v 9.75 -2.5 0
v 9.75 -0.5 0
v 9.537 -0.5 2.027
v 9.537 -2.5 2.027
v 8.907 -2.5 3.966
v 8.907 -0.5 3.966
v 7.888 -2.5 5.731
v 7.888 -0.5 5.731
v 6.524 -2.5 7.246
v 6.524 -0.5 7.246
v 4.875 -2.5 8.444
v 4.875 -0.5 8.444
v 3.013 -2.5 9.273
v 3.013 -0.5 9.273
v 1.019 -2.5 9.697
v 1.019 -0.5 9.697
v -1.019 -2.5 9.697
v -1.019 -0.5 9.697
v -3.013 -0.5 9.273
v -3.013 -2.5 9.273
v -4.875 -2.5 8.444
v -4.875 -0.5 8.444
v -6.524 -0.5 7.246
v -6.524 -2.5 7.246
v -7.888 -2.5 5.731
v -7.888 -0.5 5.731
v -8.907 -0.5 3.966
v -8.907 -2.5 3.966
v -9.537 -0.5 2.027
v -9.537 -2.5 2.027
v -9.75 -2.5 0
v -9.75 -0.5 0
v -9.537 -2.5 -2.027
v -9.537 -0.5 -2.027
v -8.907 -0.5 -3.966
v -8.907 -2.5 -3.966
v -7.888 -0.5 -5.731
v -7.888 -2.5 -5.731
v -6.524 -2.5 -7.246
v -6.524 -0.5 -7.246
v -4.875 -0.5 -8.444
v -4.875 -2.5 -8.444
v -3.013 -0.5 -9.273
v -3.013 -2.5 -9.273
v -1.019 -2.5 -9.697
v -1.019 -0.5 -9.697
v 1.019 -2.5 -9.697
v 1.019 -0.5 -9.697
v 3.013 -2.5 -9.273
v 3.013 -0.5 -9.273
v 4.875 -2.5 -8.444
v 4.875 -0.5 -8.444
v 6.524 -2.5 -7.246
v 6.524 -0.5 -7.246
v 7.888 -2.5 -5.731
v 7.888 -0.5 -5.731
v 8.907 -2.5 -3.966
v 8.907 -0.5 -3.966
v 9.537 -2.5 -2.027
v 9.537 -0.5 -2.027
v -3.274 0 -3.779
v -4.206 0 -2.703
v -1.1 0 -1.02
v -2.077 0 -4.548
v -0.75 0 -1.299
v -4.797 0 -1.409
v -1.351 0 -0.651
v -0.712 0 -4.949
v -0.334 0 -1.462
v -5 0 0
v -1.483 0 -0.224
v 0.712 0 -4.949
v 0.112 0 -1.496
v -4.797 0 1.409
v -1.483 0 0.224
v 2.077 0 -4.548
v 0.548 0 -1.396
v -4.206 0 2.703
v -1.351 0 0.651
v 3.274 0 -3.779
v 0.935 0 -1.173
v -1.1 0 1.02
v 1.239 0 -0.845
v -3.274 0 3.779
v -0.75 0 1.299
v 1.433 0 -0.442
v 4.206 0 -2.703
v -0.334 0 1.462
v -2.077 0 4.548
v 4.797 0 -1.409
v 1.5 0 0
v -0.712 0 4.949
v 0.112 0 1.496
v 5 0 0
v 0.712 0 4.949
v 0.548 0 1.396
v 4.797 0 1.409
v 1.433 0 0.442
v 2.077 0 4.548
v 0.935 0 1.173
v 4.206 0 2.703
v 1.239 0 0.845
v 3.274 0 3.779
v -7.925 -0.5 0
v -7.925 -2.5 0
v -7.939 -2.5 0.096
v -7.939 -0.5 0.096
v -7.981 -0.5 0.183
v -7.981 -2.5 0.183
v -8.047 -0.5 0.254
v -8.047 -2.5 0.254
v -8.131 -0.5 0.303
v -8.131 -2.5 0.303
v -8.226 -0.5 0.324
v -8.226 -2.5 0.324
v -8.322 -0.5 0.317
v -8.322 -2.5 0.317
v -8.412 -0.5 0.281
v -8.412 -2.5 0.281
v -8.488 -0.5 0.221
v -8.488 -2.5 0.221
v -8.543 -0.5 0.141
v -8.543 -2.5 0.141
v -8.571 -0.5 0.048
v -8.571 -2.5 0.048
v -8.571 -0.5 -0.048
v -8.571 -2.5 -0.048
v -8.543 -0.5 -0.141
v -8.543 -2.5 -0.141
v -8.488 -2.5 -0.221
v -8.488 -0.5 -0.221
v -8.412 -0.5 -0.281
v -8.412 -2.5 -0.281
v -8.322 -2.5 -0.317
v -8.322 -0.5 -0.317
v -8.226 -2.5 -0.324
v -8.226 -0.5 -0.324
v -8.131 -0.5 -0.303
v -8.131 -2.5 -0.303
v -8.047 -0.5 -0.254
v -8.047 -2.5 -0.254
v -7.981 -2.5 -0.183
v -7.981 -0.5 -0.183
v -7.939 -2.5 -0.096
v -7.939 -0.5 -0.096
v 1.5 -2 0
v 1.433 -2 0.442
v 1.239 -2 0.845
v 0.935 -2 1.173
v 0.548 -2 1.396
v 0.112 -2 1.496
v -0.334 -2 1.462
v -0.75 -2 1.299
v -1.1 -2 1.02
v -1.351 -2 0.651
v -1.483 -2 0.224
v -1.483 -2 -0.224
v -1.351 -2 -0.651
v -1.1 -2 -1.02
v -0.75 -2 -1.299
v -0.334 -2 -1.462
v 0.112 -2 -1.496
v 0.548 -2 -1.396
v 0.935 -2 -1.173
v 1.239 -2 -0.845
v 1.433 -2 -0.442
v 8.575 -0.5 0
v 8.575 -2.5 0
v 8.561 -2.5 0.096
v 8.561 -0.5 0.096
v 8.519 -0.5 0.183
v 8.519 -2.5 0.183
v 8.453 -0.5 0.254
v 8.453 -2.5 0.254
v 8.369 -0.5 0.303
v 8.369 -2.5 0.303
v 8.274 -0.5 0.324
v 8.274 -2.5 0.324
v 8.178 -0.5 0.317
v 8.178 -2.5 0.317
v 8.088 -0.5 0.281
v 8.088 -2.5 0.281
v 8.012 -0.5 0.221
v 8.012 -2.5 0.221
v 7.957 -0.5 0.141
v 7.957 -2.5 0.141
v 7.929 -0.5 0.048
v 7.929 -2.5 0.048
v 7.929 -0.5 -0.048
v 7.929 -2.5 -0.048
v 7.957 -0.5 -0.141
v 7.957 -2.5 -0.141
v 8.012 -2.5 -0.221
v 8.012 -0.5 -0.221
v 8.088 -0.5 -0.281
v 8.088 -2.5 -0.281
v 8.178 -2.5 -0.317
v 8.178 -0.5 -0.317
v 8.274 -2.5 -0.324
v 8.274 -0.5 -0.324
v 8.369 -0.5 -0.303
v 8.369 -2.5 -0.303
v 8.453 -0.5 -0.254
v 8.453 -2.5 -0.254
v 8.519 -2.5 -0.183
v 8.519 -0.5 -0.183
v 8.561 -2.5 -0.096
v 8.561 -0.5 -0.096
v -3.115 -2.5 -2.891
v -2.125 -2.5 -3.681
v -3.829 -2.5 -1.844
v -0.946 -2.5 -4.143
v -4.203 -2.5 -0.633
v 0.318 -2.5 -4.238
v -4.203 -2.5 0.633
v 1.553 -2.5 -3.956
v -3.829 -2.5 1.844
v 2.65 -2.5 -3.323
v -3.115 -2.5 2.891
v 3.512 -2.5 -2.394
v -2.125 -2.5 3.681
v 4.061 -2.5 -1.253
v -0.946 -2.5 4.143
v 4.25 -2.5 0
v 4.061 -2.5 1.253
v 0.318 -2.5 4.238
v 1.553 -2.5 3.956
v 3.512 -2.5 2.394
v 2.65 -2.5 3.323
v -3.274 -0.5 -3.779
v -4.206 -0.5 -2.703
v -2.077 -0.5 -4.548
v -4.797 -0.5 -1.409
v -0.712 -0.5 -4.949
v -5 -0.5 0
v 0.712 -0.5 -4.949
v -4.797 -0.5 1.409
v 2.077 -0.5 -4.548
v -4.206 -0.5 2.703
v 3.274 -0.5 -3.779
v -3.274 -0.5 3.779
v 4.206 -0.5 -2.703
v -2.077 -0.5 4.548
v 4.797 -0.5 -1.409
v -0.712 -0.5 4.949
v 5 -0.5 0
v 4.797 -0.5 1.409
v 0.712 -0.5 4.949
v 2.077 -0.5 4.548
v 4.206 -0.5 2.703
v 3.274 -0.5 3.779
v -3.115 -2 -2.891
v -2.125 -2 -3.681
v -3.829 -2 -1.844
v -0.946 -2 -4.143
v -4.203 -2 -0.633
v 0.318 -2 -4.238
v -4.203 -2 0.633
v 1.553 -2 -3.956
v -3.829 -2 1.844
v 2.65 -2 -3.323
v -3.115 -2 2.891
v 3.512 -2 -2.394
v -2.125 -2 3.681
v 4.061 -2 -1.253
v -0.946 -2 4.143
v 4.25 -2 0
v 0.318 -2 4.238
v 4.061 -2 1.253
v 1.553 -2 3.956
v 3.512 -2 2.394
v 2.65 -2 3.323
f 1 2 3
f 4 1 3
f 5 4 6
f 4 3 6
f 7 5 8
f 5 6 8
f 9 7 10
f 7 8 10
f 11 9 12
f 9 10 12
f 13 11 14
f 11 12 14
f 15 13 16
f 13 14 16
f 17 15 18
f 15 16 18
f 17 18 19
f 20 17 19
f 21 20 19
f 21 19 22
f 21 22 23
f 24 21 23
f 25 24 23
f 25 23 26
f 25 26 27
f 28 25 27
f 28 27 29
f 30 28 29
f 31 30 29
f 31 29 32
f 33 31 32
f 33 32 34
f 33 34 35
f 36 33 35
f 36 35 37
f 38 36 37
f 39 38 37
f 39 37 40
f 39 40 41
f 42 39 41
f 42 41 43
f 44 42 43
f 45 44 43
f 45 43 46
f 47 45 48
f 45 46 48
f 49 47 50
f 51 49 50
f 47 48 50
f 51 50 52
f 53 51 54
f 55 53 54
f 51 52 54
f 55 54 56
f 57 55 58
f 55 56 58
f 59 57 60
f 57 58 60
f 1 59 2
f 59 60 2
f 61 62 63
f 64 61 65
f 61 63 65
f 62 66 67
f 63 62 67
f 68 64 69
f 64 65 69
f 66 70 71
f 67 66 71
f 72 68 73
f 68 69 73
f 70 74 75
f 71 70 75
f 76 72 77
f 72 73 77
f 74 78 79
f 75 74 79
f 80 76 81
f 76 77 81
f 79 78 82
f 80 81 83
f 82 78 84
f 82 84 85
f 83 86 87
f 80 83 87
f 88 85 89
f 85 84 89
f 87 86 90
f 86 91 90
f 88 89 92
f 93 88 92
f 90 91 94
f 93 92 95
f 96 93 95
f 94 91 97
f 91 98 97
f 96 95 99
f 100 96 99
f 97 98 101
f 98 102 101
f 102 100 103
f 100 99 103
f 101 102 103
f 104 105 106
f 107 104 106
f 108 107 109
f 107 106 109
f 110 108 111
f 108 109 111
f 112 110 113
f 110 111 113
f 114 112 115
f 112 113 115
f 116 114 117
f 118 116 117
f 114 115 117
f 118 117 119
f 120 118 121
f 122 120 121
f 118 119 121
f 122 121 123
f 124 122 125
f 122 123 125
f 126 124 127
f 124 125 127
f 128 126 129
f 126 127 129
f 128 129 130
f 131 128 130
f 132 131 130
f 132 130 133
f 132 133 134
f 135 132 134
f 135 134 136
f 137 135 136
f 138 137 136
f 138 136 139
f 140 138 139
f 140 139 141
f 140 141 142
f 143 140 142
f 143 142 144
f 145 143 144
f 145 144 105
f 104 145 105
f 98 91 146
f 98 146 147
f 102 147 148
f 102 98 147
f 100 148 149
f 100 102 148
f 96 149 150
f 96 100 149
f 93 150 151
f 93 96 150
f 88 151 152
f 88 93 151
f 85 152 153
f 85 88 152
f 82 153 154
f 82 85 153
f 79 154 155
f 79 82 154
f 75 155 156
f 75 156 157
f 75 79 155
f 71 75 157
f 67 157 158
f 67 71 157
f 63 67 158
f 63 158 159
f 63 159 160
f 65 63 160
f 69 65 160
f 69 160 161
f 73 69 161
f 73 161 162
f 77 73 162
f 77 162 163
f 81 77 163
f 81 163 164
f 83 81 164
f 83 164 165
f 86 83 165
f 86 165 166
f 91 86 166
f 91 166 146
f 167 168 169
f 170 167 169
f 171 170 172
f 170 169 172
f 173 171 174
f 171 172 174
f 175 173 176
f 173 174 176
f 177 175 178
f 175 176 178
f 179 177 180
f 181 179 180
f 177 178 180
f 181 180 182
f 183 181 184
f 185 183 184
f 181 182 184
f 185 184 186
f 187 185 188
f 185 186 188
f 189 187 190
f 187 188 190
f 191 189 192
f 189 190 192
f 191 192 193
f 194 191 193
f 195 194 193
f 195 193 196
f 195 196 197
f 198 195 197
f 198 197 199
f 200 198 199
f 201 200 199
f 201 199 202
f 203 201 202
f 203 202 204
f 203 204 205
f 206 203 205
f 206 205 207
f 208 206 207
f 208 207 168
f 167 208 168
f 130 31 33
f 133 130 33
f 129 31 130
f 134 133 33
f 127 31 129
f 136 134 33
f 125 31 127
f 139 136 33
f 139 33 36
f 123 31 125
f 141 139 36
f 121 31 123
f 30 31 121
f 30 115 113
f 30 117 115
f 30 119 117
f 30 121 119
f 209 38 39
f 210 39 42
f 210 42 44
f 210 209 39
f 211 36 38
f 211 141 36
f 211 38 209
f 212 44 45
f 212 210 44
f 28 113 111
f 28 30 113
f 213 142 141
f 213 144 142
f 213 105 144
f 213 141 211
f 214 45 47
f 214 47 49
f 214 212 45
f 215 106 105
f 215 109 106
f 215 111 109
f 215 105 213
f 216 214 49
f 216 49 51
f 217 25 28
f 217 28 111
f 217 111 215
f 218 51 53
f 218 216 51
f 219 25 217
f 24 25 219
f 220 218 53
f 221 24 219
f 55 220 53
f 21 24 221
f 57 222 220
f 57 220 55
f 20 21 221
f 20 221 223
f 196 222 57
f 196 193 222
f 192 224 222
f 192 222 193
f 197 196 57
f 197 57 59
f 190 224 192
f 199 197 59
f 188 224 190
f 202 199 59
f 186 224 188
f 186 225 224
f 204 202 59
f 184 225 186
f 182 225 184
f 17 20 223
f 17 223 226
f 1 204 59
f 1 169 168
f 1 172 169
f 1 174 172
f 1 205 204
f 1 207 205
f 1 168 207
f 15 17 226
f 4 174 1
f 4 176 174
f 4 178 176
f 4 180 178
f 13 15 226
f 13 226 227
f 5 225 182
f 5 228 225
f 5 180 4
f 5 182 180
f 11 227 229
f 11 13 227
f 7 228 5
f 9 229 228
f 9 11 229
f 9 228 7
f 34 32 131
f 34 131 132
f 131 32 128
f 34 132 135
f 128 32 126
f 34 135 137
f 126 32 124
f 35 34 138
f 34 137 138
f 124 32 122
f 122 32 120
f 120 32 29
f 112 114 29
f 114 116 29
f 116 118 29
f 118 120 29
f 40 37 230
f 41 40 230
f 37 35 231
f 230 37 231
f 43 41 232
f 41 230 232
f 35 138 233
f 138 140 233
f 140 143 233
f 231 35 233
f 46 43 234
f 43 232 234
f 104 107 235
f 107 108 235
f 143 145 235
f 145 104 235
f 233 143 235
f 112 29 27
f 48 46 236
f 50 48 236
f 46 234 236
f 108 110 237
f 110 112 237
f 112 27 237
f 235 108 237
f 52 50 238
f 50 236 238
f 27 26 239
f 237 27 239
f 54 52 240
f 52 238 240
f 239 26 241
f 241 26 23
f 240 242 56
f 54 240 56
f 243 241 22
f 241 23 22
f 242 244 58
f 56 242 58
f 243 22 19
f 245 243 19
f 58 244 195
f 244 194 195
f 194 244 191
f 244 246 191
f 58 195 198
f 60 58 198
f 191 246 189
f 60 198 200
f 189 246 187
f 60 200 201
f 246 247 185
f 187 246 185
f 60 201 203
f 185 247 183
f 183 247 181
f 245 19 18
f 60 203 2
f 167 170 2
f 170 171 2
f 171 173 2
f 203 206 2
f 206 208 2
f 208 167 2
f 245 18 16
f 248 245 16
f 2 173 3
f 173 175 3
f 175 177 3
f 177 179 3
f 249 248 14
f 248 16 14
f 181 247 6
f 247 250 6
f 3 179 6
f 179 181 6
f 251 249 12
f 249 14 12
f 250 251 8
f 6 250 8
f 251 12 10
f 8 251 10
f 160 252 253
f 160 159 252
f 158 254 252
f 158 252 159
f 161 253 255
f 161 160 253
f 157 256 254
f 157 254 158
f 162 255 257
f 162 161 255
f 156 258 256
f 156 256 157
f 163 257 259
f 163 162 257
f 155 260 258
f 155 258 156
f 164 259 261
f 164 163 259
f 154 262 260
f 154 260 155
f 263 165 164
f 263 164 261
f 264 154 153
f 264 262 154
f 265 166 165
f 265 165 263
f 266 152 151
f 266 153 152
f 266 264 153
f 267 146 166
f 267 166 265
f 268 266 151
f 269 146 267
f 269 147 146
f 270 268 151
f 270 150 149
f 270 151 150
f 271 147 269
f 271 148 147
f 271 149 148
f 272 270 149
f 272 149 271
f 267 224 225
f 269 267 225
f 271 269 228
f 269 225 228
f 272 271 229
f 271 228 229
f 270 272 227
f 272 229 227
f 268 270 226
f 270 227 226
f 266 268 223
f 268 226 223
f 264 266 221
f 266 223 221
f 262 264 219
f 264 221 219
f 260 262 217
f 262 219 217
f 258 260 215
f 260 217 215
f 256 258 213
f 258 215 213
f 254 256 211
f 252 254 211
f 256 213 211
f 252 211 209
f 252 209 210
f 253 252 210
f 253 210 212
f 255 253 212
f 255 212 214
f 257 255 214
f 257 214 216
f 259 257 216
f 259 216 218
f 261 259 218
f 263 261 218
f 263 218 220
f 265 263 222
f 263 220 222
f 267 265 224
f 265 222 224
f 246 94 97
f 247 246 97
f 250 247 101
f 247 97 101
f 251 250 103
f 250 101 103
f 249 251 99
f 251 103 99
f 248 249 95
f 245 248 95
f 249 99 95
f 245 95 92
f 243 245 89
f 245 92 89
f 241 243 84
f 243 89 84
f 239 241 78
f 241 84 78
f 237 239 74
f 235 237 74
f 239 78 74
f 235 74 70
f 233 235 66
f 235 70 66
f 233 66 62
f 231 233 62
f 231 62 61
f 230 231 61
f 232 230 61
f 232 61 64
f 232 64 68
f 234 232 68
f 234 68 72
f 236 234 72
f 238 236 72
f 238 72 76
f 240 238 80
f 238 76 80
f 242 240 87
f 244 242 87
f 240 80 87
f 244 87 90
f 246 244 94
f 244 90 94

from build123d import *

# Parameters (mm, degrees)
F0_R     = 9.75
F0_R_2   = 5
F0_R_3   = 1.5
F1_DEPTH = 2.5
F2_DEPTH = 0.5
F3_R     = 4.25
F3_R_2   = 1.5
F4_DEPTH = 0.5
F3_R_3   = 0.325
F5_DEPTH = 2.501


with BuildPart() as f1:
    # F0 (on Front) → F1 (new body)
    with BuildSketch(Plane.XZ):
        Circle(F0_R)
        Circle(F0_R_2, mode=Mode.SUBTRACT)
        Circle(F0_R_2)
        Circle(F0_R_3, mode=Mode.SUBTRACT)
    extrude(amount=F1_DEPTH)

    # F0 (on Front) → F2 (cut)
    with BuildSketch(Plane.XZ):
        Circle(F0_R)
        Circle(F0_R_2, mode=Mode.SUBTRACT)
    extrude(amount=F2_DEPTH, mode=Mode.SUBTRACT)

    # F3 (on face) → F4 (cut)
    with BuildSketch(Plane.XZ.offset(2.5)):
        Circle(F3_R)
        Circle(F3_R_2, mode=Mode.SUBTRACT)
    extrude(amount=-F4_DEPTH, mode=Mode.SUBTRACT)

    # F3 (on face) → F5 (cut, through all)
    with BuildSketch(Plane.XZ.offset(2.5)):
        with Locations((8.25, 0)):
            Circle(F3_R_3)
        with Locations((-8.25, 0)):
            Circle(F3_R_3)
    extrude(amount=-F5_DEPTH, mode=Mode.SUBTRACT)


solid = f1.part
